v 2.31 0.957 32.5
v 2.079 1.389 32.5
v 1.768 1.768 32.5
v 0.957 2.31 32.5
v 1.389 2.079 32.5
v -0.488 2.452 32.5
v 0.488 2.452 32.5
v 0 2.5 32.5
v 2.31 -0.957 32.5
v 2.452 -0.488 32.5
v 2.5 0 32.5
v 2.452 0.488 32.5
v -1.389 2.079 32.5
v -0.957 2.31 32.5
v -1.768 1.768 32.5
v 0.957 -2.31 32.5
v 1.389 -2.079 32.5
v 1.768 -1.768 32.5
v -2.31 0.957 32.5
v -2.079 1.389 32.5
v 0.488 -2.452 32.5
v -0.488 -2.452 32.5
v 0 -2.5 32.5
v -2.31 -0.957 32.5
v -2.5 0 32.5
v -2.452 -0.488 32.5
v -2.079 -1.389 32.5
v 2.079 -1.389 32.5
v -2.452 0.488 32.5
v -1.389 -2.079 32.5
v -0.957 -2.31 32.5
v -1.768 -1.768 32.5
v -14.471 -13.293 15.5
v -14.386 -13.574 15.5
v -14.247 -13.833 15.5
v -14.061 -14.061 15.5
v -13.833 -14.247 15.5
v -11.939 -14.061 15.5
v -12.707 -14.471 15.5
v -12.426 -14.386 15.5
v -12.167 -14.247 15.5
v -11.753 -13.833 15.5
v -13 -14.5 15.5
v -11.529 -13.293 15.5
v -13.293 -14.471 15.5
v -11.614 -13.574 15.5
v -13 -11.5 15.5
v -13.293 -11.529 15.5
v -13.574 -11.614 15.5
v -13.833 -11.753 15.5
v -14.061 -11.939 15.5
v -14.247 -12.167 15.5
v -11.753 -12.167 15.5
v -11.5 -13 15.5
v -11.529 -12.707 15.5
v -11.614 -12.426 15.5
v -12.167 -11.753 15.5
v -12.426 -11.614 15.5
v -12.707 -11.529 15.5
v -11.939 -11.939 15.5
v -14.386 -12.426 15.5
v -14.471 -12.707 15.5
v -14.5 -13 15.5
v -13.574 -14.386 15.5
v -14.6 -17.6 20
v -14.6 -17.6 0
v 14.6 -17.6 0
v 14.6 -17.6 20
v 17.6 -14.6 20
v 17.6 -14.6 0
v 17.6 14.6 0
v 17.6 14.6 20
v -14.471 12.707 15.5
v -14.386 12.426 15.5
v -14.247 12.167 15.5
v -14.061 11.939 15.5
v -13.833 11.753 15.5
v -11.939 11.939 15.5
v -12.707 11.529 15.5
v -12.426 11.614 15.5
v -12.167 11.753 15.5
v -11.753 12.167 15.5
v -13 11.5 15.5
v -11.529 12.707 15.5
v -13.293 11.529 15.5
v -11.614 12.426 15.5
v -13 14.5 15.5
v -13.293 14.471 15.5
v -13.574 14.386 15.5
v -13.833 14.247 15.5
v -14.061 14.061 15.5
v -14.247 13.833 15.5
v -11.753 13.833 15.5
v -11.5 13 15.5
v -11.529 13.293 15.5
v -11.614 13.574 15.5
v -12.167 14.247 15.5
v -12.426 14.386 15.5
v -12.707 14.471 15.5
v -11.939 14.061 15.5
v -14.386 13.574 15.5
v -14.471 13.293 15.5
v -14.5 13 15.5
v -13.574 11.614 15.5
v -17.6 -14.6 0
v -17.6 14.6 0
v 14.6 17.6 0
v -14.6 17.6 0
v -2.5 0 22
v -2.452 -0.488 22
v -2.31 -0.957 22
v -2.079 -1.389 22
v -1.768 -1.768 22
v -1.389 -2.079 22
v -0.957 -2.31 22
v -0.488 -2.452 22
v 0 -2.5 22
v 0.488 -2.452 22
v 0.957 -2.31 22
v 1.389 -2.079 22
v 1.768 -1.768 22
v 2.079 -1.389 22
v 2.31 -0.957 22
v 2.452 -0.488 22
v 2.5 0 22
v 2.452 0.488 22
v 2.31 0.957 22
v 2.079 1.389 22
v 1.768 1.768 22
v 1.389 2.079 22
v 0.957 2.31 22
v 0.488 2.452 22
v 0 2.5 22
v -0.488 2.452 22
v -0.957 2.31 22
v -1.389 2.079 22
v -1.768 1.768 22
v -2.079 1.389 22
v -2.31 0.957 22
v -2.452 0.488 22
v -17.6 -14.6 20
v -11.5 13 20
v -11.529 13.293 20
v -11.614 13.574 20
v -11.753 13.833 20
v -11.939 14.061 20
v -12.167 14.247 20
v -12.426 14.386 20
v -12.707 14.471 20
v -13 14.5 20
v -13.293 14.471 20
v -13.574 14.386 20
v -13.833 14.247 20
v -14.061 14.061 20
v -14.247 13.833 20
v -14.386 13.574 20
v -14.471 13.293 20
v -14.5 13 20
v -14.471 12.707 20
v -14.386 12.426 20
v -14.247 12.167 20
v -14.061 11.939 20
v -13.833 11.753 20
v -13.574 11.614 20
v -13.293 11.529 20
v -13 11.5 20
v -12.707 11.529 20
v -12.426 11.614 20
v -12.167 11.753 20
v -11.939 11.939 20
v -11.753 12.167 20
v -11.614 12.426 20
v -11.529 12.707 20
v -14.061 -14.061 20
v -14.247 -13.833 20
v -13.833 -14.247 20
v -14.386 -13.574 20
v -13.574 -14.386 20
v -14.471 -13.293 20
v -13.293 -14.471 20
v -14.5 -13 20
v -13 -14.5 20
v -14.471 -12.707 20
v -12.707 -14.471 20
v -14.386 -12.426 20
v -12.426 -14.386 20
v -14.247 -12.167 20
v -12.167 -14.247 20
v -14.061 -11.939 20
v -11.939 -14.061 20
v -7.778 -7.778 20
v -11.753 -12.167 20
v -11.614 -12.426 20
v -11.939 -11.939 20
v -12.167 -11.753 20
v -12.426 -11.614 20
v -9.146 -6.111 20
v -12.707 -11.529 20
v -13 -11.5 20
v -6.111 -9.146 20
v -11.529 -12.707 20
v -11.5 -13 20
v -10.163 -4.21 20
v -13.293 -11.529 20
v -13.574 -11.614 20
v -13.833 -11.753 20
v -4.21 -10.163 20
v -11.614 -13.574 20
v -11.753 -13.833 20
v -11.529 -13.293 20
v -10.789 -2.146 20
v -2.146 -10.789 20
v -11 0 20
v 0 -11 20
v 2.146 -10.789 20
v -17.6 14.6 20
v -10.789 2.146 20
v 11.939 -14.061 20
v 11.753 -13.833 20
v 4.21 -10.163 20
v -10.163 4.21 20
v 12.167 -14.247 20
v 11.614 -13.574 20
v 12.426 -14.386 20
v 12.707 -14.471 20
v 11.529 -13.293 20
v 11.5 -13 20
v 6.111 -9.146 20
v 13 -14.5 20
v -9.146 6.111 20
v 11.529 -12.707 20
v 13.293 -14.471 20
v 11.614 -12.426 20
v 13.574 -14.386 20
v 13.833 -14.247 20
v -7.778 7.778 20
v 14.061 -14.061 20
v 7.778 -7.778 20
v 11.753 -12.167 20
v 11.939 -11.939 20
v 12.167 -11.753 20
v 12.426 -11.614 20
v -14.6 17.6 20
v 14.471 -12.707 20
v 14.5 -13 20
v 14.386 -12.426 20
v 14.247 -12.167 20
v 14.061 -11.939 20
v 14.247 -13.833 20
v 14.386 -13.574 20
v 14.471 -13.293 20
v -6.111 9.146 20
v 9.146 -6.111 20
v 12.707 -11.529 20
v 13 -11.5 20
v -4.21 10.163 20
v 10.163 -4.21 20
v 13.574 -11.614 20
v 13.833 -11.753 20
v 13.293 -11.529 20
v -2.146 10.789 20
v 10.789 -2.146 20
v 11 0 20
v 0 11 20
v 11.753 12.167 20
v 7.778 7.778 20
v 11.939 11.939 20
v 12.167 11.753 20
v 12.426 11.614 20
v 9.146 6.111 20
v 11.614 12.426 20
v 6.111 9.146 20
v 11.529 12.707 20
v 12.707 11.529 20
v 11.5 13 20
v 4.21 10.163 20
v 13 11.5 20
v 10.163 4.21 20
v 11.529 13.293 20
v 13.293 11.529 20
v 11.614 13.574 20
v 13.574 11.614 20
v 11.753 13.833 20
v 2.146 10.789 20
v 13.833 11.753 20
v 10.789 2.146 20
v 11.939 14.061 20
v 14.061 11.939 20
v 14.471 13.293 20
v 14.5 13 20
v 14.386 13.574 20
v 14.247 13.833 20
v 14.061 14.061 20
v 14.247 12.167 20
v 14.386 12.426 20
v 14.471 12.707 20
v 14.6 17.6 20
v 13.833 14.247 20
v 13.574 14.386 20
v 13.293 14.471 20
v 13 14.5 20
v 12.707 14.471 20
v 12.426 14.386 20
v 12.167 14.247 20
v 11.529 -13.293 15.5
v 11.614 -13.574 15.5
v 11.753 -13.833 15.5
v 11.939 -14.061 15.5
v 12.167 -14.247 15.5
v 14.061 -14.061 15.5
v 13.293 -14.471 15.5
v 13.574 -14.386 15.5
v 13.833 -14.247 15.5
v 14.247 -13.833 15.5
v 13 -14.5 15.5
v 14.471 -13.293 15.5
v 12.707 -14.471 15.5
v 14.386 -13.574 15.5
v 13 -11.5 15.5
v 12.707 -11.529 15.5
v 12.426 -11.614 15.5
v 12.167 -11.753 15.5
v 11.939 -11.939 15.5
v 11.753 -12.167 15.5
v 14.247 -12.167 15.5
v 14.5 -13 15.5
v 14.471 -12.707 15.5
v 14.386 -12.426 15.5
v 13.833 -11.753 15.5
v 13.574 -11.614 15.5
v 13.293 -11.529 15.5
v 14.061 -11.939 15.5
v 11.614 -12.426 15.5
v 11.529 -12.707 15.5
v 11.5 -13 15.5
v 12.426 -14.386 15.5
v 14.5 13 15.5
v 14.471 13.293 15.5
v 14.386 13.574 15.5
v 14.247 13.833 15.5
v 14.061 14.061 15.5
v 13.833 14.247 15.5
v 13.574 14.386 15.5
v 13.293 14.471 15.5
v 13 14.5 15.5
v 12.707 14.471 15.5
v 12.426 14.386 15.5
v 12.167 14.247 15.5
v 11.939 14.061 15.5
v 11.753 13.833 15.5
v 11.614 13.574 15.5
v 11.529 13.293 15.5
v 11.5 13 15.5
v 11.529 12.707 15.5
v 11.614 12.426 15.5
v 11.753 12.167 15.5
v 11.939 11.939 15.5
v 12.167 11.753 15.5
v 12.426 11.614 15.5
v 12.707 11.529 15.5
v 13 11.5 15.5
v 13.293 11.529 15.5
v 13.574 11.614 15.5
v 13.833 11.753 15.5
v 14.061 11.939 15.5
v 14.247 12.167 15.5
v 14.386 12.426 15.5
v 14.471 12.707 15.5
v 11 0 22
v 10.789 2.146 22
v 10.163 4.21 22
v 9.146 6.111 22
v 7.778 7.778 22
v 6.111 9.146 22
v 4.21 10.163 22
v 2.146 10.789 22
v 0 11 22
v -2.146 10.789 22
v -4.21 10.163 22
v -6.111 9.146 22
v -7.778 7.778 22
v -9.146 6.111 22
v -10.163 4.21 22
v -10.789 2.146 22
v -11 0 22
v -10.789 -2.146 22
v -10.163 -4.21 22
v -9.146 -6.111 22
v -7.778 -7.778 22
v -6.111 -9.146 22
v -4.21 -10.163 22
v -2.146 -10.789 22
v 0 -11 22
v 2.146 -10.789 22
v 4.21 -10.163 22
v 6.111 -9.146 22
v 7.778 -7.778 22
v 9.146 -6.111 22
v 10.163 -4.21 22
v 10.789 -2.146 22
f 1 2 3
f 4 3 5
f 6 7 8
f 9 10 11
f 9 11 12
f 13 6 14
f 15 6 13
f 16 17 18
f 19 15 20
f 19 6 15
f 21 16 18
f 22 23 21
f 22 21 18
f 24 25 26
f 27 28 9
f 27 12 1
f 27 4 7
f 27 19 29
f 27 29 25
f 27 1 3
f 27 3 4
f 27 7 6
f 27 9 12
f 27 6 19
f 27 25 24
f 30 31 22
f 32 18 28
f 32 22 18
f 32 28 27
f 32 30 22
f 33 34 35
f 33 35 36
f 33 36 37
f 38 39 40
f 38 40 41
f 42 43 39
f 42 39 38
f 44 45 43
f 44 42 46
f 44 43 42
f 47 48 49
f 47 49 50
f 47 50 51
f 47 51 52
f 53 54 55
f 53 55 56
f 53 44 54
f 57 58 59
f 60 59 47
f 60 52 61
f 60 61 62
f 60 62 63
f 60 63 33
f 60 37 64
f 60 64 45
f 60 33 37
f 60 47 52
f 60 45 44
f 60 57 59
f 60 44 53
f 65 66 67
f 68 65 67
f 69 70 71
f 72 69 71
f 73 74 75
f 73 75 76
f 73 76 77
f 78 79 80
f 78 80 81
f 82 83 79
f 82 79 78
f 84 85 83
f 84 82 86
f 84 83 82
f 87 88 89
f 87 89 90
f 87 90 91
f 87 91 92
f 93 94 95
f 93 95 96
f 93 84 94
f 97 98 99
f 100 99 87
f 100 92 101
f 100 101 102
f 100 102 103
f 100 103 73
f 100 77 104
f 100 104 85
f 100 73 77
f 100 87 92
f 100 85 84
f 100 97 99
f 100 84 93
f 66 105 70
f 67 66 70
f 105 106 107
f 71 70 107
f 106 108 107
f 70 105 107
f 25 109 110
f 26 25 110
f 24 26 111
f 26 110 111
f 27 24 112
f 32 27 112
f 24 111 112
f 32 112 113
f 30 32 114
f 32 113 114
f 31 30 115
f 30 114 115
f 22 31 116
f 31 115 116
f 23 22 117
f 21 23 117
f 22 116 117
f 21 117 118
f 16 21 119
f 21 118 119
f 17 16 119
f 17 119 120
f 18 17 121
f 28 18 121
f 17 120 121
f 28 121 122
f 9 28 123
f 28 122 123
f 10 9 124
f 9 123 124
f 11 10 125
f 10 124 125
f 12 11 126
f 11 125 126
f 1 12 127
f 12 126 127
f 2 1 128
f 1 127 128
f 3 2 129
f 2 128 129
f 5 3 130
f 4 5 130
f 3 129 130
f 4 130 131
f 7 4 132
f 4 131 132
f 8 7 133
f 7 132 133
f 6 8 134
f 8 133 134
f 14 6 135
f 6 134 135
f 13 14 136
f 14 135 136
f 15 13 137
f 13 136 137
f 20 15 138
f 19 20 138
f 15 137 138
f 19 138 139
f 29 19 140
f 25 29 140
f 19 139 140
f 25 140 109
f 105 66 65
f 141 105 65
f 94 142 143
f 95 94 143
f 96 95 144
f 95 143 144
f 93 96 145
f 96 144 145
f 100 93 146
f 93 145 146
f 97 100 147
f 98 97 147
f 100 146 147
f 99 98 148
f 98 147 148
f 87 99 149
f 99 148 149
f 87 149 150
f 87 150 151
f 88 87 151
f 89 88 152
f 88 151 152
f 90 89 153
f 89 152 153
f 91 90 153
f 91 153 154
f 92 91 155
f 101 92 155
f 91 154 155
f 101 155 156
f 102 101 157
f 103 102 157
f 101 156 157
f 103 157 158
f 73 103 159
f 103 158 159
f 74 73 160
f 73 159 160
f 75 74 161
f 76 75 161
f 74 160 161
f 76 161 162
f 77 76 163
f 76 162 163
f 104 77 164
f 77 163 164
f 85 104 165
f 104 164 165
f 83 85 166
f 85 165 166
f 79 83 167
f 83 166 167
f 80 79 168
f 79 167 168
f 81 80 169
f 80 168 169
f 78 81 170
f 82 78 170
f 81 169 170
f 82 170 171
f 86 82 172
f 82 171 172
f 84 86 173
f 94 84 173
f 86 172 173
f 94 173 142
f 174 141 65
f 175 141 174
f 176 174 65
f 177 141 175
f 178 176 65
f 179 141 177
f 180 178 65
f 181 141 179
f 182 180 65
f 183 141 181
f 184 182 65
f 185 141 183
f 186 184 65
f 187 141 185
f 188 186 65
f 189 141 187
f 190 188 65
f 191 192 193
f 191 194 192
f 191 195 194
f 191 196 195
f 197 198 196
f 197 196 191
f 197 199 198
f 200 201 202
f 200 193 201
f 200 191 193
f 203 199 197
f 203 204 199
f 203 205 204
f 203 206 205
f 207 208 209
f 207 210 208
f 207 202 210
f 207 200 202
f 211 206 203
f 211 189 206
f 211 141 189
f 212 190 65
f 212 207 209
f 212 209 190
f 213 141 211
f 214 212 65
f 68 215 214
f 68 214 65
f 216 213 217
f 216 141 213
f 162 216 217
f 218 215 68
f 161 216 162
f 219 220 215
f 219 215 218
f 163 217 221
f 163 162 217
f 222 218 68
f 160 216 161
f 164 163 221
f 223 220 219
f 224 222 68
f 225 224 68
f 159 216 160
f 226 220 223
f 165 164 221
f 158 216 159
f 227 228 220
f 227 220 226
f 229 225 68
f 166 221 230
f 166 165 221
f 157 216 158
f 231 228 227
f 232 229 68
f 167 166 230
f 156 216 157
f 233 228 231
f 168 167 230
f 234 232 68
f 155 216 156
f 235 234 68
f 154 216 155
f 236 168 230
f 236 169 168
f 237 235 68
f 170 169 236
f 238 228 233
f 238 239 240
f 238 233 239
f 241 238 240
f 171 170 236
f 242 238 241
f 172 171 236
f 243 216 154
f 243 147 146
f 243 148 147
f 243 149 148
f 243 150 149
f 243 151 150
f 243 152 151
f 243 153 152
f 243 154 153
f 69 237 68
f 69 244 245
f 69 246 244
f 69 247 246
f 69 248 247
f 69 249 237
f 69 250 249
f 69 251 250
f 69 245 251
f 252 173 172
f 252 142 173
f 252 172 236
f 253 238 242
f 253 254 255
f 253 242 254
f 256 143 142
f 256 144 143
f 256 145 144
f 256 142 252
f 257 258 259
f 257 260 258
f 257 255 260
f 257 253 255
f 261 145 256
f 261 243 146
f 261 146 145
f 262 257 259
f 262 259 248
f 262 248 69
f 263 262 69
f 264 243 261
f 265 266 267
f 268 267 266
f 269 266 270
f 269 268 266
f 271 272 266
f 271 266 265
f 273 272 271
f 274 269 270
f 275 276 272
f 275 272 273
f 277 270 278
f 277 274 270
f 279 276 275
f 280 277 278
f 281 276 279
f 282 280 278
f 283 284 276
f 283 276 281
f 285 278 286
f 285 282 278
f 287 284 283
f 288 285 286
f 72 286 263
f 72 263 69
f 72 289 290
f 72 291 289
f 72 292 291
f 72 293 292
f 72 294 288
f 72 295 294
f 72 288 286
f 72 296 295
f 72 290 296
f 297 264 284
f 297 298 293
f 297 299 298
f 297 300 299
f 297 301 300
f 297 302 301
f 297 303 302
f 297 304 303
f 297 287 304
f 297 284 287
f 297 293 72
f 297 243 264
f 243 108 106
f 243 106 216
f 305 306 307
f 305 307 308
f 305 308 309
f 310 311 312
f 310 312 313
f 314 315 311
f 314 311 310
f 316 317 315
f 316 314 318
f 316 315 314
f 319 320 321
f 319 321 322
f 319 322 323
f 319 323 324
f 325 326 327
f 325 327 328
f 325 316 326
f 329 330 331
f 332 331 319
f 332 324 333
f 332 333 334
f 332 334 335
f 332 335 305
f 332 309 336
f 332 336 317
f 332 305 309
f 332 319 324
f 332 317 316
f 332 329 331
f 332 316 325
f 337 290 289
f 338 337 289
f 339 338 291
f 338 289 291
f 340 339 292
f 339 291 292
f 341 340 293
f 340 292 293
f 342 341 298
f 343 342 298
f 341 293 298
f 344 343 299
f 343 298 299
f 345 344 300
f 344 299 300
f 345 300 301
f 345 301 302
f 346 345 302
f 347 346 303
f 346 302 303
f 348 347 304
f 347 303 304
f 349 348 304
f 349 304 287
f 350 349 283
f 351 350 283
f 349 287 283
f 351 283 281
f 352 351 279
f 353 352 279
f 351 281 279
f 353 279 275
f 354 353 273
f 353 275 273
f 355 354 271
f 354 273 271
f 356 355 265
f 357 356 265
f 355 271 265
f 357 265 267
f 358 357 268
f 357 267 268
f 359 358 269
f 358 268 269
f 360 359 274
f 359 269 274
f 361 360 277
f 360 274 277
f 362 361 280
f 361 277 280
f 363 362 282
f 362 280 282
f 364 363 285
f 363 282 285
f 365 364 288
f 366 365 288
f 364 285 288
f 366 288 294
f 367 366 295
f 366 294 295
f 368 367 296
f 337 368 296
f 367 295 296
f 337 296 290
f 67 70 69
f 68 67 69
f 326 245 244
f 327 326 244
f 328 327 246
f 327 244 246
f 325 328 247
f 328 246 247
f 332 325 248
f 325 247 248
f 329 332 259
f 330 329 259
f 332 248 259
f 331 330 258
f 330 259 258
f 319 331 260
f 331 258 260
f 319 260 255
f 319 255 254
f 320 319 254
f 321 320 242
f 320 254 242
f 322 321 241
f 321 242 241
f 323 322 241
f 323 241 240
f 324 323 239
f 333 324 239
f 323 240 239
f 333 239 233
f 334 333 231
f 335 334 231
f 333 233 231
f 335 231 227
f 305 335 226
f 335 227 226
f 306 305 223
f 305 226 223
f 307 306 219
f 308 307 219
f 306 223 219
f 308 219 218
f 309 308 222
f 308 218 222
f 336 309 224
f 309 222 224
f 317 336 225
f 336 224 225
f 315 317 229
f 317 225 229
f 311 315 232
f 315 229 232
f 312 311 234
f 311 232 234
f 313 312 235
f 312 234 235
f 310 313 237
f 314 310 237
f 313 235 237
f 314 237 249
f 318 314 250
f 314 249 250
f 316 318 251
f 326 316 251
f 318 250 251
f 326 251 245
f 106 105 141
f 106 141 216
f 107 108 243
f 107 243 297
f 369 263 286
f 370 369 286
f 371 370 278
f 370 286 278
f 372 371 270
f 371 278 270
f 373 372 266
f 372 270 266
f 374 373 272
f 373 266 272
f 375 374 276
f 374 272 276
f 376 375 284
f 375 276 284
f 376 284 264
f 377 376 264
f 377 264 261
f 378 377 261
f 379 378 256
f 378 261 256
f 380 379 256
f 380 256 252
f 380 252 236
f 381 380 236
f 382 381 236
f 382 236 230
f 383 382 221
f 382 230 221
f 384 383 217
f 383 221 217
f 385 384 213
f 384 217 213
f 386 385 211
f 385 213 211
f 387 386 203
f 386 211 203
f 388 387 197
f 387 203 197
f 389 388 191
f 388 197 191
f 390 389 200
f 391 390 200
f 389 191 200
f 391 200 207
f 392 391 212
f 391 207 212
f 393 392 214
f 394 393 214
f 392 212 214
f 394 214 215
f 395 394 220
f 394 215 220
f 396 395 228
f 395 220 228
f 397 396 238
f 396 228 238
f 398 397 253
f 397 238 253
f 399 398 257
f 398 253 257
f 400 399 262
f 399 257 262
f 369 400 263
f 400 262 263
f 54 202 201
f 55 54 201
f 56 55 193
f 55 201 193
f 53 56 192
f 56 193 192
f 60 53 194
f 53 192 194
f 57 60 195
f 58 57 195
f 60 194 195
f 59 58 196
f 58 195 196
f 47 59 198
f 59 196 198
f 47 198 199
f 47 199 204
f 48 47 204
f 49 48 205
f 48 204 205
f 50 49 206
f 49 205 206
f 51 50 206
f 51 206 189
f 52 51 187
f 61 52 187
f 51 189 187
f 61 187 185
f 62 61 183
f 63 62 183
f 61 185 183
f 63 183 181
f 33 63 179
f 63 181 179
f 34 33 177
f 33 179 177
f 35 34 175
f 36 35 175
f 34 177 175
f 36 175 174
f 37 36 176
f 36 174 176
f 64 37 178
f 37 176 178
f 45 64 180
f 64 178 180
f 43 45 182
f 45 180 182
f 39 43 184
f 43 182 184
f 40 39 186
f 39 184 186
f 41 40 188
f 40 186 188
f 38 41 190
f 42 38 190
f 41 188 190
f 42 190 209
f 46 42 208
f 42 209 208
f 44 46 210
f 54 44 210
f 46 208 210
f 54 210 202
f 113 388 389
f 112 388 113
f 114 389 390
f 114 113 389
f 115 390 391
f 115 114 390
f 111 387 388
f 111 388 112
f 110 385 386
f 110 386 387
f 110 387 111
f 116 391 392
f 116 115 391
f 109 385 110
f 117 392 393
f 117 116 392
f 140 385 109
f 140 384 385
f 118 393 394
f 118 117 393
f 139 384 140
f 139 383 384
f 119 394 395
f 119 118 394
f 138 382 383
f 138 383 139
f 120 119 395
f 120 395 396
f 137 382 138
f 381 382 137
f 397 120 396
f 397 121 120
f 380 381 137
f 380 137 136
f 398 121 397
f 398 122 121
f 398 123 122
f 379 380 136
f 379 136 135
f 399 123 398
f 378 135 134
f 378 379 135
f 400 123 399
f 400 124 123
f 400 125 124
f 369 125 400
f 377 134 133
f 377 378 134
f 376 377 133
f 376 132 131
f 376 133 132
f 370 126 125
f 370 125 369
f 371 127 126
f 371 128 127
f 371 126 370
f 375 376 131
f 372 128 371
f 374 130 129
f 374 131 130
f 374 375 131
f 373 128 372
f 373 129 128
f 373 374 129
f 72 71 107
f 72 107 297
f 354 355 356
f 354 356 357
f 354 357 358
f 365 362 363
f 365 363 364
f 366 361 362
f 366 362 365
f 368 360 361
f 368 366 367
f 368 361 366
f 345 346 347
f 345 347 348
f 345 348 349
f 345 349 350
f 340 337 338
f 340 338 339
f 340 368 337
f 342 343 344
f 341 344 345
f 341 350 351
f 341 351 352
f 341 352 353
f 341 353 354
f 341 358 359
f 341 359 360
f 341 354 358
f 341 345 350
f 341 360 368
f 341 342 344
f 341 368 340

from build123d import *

# Parameters (mm, degrees)
SKETCH1_W           = 35.2
SKETCH1_H           = 35.2
BOSS_EXTRUDE1_DEPTH = 20
SKETCH2_R           = 11
BOSS_EXTRUDE2_DEPTH = 2
SKETCH3_R           = 2.5
BOSS_EXTRUDE3_DEPTH = 10.5
SKETCH4_R           = 1.5
CUT_EXTRUDE1_DEPTH  = 4.5
CHAMFER1_SIZE       = 3


with BuildPart() as part:
    # Sketch1 → Boss-Extrude1 (new body)
    with BuildSketch(Plane.XY):
        Rectangle(SKETCH1_W, SKETCH1_H)
    extrude(amount=BOSS_EXTRUDE1_DEPTH)

    # Sketch2 → Boss-Extrude2 (add)
    with BuildSketch(Plane.XY.offset(20)):
        Circle(SKETCH2_R)
    extrude(amount=BOSS_EXTRUDE2_DEPTH)

    # Sketch3 → Boss-Extrude3 (add)
    with BuildSketch(Plane.XY.offset(22)):
        with Locations(Location((0, 0, 0), (0, 0, 180))):
            Circle(SKETCH3_R)
    extrude(amount=BOSS_EXTRUDE3_DEPTH)

    # Sketch4 → Cut-Extrude1 (cut)
    with BuildSketch(Plane.XY.offset(20)):
        with Locations((13, 13)):
            Circle(SKETCH4_R)
        with Locations((13, -13)):
            Circle(SKETCH4_R)
        with Locations((-13, -13)):
            Circle(SKETCH4_R)
        with Locations((-13, 13)):
            Circle(SKETCH4_R)
    extrude(amount=-CUT_EXTRUDE1_DEPTH, mode=Mode.SUBTRACT)

    # Chamfer1
    chamfer1_edges = [part.edges().sort_by_distance(p)[0] for p in [
        (17.6, -17.6, 10),
        (-17.6, -17.6, 10),
        (-17.6, 17.6, 10),
        (17.6, 17.6, 10),
    ]]
    chamfer(chamfer1_edges, length=CHAMFER1_SIZE)


solid = part.part
